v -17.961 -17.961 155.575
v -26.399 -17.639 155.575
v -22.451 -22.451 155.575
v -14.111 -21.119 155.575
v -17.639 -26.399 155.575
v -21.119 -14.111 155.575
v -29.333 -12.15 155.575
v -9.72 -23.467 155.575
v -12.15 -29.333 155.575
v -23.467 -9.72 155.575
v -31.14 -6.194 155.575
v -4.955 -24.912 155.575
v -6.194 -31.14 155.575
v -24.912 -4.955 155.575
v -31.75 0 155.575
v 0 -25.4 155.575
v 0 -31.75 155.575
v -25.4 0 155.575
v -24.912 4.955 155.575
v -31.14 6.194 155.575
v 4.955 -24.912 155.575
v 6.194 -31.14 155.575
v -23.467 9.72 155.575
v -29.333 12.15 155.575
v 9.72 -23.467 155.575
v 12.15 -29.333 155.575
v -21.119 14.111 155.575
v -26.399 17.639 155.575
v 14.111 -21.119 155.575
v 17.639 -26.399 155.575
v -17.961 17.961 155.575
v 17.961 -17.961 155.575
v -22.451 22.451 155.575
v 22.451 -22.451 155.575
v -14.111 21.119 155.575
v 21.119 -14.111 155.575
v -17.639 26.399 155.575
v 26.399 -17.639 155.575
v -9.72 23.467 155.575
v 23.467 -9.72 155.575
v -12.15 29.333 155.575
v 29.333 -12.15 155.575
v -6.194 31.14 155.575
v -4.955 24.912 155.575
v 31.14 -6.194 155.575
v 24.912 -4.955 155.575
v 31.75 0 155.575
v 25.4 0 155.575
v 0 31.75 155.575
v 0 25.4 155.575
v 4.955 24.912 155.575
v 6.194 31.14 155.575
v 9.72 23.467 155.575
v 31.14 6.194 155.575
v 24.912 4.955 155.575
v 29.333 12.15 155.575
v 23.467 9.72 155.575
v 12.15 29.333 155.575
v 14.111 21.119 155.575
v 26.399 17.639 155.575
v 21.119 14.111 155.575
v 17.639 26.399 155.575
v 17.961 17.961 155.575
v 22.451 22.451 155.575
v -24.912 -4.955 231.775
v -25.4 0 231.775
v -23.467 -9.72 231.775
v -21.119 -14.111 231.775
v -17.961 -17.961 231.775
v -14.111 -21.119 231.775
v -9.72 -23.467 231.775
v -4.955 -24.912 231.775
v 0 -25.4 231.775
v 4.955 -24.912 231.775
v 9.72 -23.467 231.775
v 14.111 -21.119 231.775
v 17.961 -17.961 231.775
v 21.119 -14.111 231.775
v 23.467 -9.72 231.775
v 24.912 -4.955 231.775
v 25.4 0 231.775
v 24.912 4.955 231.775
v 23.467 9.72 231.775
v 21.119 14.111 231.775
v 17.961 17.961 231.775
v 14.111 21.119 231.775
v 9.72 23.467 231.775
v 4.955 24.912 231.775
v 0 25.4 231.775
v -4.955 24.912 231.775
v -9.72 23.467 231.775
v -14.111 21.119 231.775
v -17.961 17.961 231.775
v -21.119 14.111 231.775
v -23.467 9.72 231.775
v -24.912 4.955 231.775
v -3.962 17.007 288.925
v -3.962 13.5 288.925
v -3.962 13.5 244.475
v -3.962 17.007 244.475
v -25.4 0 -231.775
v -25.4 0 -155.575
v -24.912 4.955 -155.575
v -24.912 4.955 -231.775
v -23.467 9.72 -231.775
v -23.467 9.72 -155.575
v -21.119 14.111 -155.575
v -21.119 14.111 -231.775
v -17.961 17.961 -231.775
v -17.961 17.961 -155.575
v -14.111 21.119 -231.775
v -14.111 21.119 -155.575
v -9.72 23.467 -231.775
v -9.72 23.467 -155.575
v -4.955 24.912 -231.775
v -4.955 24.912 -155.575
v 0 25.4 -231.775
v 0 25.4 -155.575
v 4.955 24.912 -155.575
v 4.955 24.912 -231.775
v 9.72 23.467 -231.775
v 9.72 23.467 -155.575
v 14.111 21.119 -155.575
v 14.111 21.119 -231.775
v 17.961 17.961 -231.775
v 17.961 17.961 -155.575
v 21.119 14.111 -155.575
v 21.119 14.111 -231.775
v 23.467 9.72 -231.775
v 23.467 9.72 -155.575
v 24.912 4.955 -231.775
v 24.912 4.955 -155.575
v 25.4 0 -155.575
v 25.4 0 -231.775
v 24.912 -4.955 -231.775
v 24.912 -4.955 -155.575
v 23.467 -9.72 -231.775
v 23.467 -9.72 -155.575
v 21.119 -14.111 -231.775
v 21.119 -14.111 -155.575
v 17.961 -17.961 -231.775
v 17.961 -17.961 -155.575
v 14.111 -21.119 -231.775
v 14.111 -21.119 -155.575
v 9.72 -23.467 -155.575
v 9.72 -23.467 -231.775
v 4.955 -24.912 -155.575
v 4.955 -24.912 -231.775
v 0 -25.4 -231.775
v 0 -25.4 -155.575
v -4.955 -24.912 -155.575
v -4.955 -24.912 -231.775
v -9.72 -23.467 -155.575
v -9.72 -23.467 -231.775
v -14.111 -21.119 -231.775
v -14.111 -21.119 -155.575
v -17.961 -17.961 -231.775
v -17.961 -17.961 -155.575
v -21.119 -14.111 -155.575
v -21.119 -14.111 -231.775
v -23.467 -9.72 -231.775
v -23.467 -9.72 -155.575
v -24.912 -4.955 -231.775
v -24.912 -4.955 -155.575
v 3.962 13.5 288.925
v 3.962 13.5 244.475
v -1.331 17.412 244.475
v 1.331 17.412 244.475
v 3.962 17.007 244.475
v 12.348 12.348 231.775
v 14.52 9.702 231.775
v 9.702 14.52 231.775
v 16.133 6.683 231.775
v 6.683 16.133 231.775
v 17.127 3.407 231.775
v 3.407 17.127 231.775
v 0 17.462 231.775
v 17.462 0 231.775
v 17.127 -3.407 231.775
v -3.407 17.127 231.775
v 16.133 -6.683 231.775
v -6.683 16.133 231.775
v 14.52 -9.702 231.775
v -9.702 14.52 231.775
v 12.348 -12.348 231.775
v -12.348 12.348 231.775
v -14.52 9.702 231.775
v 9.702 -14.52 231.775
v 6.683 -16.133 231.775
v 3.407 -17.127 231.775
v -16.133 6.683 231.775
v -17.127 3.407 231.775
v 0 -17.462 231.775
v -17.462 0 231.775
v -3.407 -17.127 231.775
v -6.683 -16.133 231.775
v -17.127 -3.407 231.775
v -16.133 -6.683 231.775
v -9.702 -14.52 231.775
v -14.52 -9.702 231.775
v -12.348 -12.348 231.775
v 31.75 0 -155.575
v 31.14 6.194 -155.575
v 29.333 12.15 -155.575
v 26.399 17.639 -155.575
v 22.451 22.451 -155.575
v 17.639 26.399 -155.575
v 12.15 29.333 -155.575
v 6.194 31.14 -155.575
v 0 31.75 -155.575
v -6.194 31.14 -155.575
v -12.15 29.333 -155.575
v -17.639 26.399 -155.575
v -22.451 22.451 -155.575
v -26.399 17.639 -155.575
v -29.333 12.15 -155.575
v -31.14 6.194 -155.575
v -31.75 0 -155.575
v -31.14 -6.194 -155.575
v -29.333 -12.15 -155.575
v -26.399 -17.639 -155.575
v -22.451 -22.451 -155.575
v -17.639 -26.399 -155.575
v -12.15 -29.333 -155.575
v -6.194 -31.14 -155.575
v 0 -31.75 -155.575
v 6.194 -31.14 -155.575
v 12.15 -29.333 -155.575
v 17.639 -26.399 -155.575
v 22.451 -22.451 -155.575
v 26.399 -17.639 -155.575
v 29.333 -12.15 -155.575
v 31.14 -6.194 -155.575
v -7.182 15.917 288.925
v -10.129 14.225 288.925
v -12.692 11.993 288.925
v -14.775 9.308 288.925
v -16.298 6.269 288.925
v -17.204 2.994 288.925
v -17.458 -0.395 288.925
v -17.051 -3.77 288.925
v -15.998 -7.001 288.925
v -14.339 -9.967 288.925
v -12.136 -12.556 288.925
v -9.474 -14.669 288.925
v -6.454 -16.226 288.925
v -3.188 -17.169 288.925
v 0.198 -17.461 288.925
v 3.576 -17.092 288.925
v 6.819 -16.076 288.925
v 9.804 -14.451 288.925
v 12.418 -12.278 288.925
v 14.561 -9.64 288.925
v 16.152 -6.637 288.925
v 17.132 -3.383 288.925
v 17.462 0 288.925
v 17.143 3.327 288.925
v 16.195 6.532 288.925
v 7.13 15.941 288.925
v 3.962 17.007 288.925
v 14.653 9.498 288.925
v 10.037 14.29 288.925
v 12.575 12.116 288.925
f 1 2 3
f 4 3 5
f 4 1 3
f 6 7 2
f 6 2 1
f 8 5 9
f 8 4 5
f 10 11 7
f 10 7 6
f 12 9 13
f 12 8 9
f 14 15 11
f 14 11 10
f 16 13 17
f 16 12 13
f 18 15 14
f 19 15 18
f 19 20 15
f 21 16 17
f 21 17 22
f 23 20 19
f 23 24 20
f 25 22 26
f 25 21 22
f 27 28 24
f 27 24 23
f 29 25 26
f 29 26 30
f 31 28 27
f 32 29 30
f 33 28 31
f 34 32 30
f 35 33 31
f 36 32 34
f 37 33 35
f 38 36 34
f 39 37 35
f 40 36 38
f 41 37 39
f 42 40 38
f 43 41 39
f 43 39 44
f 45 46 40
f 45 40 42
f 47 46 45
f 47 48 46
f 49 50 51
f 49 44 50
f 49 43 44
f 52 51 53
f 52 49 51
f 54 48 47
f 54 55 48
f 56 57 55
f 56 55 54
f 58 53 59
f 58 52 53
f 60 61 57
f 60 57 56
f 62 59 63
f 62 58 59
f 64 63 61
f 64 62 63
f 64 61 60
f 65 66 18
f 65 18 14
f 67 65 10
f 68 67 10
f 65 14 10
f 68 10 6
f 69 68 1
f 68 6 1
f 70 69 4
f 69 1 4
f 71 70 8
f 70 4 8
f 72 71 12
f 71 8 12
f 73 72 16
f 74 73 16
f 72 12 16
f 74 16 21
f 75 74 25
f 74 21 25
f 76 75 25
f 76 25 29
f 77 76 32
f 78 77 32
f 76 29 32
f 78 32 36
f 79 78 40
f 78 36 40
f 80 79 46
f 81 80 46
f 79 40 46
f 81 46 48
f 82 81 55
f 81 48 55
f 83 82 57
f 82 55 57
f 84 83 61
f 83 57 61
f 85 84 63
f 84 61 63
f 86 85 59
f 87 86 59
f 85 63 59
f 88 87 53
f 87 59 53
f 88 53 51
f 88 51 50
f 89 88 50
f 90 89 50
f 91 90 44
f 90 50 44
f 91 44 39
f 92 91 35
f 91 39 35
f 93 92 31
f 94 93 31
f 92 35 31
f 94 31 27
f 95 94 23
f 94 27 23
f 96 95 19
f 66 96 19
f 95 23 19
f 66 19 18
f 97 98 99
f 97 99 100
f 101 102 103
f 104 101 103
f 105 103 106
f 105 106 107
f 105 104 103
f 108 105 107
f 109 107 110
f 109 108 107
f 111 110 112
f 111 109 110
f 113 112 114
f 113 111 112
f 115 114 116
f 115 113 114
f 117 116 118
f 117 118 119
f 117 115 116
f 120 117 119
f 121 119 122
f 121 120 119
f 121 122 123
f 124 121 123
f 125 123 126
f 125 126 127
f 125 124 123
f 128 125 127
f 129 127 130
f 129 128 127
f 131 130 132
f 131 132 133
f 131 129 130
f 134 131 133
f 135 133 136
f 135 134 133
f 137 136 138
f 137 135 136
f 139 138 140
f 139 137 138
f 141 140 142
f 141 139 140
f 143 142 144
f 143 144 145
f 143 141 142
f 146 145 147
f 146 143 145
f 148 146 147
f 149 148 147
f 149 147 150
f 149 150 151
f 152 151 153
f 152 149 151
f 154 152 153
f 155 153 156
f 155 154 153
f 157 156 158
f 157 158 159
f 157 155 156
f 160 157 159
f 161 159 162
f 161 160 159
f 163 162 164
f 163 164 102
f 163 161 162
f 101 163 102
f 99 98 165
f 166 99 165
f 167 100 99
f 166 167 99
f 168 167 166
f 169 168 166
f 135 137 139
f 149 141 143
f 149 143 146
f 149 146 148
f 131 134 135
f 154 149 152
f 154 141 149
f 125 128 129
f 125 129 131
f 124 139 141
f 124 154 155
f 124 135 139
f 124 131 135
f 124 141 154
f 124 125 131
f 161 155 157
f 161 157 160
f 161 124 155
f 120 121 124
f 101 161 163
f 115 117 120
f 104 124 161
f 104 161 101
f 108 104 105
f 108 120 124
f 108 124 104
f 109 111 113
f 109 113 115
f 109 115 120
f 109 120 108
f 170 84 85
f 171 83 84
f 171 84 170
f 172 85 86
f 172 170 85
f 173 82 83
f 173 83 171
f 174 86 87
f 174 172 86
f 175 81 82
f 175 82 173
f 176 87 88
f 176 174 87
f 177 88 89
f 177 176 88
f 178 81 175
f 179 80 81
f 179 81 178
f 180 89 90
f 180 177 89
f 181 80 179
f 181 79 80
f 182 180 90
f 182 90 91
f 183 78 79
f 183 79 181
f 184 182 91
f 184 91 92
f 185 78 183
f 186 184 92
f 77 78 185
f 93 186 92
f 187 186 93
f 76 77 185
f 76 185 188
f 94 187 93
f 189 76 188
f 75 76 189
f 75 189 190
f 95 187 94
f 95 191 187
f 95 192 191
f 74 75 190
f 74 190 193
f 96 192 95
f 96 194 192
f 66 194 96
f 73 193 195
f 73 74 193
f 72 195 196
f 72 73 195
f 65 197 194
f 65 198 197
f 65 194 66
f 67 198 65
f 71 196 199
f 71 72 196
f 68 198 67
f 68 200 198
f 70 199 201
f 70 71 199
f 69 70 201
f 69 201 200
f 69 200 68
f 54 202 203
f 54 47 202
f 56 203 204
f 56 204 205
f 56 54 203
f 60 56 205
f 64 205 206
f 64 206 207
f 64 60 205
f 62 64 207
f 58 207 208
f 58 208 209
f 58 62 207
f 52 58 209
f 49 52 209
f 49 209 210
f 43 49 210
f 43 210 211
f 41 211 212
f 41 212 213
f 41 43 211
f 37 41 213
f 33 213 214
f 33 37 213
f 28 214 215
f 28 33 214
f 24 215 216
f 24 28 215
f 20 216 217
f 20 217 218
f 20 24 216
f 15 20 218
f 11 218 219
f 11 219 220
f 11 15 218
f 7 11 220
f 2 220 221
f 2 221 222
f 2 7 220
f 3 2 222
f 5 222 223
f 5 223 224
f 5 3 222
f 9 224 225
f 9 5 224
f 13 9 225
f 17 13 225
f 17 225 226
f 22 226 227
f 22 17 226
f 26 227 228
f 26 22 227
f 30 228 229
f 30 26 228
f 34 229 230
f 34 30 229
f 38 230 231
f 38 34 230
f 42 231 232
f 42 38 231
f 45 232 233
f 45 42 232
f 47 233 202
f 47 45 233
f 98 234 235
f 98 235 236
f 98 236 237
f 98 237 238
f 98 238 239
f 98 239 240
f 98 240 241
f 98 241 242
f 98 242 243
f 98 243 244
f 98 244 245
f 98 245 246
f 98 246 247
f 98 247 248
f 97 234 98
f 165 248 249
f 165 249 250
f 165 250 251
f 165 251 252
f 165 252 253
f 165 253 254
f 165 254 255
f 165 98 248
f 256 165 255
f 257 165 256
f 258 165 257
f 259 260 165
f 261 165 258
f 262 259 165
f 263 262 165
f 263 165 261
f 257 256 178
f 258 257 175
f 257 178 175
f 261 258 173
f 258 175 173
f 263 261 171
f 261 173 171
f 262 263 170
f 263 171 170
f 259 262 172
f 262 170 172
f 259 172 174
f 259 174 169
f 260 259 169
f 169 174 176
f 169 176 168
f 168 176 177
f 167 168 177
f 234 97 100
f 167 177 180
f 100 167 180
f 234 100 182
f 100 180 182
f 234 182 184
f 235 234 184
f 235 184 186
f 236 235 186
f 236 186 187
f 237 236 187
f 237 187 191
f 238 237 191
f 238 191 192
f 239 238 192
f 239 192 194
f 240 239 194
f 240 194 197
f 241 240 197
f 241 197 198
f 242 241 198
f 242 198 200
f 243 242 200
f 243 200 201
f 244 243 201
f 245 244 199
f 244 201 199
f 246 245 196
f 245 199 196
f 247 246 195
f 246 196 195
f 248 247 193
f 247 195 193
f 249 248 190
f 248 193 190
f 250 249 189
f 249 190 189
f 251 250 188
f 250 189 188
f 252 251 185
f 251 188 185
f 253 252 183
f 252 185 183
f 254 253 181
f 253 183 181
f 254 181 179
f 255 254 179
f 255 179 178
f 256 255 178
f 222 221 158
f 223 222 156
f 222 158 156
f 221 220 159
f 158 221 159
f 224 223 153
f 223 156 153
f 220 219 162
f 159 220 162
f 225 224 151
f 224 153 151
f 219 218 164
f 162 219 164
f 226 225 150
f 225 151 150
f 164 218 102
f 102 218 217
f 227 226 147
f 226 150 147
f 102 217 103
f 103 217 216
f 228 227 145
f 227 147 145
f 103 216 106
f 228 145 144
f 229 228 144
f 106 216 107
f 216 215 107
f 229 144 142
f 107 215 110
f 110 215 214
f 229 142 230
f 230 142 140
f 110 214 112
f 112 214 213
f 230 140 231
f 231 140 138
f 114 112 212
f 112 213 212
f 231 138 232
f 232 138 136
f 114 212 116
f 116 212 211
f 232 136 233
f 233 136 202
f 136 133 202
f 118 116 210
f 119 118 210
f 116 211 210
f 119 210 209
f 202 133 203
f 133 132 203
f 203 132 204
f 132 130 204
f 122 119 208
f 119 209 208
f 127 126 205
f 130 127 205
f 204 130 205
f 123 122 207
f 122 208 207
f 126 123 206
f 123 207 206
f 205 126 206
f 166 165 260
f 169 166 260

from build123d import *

# Parameters (mm, degrees)
SKETCH1_R           = 31.75
BOSS_EXTRUDE1_DEPTH = 155.575
SKETCH2_R           = 25.4
BOSS_EXTRUDE2_DEPTH = 76.2
BOSS_EXTRUDE3_START = 76.2
SKETCH3_R           = 25.4
BOSS_EXTRUDE3_DEPTH = 76.2
SKETCH18_R          = 17.4625
BOSS_EXTRUDE6_DEPTH = 57.15
SKETCH20_W          = 7.9248
SKETCH20_H          = 7.9248
CUT_EXTRUDE1_DEPTH  = 44.45


with BuildPart() as part:
    # Sketch1 → Boss-Extrude1 (new, symmetric)
    with BuildSketch(Plane.XY):
        Circle(SKETCH1_R)
    extrude(amount=BOSS_EXTRUDE1_DEPTH, both=True)

    # Sketch2 → Boss-Extrude2 (add)
    with BuildSketch(Plane.XY.offset(155.575)):
        with Locations(Location((0, 0, 0), (0, 0, 180))):
            Circle(SKETCH2_R)
    extrude(amount=BOSS_EXTRUDE2_DEPTH)

    # Sketch3 → Boss-Extrude3 (add)
    with BuildSketch(Plane(origin=(0, 0, -155.575), x_dir=(-1, 0, 0), z_dir=(0, 0, -1)).offset(BOSS_EXTRUDE3_START)):
        Circle(SKETCH3_R)
    extrude(amount=-BOSS_EXTRUDE3_DEPTH)

    # Sketch18 → Boss-Extrude6 (add)
    with BuildSketch(Plane.XY.offset(231.775)):
        Circle(SKETCH18_R)
    extrude(amount=BOSS_EXTRUDE6_DEPTH)

    # Sketch20 → Cut-Extrude1 (cut)
    with BuildSketch(Plane.XY.offset(288.925)):
        with Locations((0, 17.4625)):
            Rectangle(SKETCH20_W, SKETCH20_H)
    extrude(amount=-CUT_EXTRUDE1_DEPTH, mode=Mode.SUBTRACT)


solid = part.part
